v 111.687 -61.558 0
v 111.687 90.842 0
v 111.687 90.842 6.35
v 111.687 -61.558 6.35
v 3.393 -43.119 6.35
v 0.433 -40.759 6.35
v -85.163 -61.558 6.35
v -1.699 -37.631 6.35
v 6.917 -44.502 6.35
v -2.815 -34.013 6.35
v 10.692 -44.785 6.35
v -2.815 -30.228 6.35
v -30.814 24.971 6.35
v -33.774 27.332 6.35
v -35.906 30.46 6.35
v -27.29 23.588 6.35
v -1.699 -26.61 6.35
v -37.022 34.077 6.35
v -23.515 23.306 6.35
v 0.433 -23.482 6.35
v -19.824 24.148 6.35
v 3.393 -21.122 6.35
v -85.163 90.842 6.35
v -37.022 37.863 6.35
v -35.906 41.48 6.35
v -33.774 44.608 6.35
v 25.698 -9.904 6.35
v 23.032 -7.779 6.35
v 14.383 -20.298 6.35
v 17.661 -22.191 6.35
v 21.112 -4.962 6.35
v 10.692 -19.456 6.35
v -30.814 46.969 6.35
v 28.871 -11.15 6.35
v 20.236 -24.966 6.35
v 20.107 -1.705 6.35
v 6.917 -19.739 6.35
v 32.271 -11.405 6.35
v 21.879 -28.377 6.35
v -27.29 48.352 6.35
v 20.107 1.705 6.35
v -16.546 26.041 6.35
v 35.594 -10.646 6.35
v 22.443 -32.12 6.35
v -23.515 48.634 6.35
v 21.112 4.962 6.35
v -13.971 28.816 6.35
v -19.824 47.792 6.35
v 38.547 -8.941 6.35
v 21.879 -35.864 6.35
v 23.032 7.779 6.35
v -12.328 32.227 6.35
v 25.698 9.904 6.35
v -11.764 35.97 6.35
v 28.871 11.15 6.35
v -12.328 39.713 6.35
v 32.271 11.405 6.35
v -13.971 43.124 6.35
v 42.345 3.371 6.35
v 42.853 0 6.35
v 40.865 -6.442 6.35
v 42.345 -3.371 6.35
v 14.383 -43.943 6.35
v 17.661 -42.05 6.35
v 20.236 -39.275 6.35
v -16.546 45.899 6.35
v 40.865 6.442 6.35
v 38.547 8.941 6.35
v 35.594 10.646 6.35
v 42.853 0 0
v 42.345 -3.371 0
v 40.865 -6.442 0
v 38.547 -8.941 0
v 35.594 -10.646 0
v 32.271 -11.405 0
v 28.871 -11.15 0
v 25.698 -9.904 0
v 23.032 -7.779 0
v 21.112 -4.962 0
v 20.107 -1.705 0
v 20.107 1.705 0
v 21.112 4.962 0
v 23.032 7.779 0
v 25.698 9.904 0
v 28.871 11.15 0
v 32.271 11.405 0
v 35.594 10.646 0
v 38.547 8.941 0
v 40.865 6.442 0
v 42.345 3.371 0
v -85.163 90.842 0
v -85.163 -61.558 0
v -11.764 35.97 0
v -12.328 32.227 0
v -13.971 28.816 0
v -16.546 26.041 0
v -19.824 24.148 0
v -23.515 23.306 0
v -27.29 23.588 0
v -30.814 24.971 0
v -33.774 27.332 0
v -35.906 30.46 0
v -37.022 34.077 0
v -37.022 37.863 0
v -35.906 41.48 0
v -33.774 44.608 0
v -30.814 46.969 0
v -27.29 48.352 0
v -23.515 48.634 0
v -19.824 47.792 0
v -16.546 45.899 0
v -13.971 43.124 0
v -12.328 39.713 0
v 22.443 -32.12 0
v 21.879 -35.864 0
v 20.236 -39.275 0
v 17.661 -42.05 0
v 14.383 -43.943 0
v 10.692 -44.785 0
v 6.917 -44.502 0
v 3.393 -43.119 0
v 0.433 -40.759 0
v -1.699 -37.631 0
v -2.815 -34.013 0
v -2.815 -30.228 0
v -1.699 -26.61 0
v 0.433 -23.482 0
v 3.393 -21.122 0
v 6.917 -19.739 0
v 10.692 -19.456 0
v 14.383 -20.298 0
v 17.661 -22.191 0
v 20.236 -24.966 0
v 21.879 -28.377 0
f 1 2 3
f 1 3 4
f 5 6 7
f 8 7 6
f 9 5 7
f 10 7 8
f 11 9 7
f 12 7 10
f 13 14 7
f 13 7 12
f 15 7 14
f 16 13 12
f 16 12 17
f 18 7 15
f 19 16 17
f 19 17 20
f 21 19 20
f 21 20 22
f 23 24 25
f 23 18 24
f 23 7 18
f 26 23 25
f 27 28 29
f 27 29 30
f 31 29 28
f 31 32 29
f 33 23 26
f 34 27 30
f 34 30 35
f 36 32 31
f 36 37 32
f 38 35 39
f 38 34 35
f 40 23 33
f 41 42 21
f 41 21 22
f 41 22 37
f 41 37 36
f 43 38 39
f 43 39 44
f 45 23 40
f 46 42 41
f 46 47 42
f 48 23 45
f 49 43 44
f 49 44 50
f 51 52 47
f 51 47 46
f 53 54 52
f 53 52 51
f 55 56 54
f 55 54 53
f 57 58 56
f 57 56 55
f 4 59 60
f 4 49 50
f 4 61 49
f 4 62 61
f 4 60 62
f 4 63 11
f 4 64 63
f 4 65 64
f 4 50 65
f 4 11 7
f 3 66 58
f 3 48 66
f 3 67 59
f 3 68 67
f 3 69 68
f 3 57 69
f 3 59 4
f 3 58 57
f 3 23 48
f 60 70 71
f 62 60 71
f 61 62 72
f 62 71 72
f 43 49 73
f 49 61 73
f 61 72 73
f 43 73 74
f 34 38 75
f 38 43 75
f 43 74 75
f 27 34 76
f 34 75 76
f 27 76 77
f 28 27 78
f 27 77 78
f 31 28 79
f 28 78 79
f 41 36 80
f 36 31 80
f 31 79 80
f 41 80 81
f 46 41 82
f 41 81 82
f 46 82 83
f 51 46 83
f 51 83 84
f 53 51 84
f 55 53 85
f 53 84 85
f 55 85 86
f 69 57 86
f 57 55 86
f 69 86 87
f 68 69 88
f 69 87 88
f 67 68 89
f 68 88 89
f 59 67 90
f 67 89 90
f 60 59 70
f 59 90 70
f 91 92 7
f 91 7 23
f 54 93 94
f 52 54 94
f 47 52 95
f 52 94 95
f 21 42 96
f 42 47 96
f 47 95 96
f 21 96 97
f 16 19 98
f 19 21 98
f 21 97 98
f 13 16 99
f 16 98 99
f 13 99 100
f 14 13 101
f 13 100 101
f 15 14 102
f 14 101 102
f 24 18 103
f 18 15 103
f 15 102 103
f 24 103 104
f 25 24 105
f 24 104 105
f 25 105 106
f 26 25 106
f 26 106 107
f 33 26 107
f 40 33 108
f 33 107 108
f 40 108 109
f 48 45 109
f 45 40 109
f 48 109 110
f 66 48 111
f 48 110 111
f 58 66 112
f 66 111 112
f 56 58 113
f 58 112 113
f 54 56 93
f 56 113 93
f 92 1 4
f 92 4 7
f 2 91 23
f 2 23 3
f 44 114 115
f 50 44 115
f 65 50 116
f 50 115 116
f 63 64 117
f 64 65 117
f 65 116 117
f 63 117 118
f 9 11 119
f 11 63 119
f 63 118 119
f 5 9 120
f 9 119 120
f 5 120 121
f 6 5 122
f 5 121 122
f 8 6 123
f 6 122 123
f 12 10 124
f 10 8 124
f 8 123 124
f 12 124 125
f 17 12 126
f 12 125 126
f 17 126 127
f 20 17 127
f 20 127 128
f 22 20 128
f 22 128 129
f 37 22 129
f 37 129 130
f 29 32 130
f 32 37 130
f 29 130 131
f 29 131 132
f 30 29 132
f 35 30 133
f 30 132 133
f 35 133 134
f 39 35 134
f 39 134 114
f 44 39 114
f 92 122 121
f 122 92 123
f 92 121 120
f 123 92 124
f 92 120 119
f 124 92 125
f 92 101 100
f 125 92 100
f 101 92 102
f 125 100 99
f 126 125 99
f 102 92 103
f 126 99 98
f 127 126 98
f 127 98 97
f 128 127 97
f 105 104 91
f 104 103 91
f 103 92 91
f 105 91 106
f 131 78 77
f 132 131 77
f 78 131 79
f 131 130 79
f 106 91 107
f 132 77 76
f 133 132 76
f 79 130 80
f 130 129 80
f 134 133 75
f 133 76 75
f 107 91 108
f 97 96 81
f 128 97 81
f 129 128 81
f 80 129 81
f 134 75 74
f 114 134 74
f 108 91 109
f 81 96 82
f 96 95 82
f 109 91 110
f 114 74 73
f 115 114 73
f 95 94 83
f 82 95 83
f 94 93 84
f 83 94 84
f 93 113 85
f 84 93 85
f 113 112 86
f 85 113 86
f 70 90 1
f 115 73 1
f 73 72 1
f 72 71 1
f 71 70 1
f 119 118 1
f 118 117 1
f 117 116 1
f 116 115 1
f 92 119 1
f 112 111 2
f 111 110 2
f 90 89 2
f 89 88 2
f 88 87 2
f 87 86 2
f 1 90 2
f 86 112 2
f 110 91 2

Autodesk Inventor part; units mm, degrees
ref_plane "YZ Plane" through (0, 0, 0) normal (1, 0, 0) x (0, 1, 0)
ref_plane "XZ Plane" through (0, 0, 0) normal (0, 1, 0) x (-1, 0, 0)
ref_plane "XY Plane" through (0, 0, 0) normal (0, 0, 1) x (1, 0, 0)
sketch "Sketch1" plane through (0, 0, 0) normal (0, 0, 1) x (1, 0, 0)
  circle A0 centre (-24.464, 35.97) radius 1.27 projected
  circle A1 centre (31.416, 0) radius 3.175 projected
  line L0 (-56.214, -50.8) -> (-56.214, 50.8) projected
  line L1 (97.7735, -50.8) -> (-56.214, -50.8) projected
  line L2 (97.7735, 50.8) -> (97.7735, -50.8) projected
  line L3 (-56.214, 50.8) -> (97.7735, 50.8) projected
  circle A2 centre (9.7431, -32.1205) radius 12.7 projected
  circle A3 centre (-24.464, 35.97) radius 12.7 projected
  circle A4 centre (31.416, 0) radius 11.4366
  line L4 (111.6872, -61.5577) -> (-85.1628, -61.5577)
  line L5 (-85.1628, -61.5577) -> (-85.1628, 90.8423)
  line L6 (-85.1628, 90.8423) -> (111.6872, 90.8423)
  line L7 (111.6872, 90.8423) -> (111.6872, -61.5577)
  point P0 (0, 0)
  dimension "d0" = 196.85
  dimension "d1" = 152.4
extrude "Extrusion1" add sketch "Sketch1" along normal blind 6.35 contours L0 L3 L2 L1 | L4 L5 L6 L7
properties part number "tiltBoxBase"
